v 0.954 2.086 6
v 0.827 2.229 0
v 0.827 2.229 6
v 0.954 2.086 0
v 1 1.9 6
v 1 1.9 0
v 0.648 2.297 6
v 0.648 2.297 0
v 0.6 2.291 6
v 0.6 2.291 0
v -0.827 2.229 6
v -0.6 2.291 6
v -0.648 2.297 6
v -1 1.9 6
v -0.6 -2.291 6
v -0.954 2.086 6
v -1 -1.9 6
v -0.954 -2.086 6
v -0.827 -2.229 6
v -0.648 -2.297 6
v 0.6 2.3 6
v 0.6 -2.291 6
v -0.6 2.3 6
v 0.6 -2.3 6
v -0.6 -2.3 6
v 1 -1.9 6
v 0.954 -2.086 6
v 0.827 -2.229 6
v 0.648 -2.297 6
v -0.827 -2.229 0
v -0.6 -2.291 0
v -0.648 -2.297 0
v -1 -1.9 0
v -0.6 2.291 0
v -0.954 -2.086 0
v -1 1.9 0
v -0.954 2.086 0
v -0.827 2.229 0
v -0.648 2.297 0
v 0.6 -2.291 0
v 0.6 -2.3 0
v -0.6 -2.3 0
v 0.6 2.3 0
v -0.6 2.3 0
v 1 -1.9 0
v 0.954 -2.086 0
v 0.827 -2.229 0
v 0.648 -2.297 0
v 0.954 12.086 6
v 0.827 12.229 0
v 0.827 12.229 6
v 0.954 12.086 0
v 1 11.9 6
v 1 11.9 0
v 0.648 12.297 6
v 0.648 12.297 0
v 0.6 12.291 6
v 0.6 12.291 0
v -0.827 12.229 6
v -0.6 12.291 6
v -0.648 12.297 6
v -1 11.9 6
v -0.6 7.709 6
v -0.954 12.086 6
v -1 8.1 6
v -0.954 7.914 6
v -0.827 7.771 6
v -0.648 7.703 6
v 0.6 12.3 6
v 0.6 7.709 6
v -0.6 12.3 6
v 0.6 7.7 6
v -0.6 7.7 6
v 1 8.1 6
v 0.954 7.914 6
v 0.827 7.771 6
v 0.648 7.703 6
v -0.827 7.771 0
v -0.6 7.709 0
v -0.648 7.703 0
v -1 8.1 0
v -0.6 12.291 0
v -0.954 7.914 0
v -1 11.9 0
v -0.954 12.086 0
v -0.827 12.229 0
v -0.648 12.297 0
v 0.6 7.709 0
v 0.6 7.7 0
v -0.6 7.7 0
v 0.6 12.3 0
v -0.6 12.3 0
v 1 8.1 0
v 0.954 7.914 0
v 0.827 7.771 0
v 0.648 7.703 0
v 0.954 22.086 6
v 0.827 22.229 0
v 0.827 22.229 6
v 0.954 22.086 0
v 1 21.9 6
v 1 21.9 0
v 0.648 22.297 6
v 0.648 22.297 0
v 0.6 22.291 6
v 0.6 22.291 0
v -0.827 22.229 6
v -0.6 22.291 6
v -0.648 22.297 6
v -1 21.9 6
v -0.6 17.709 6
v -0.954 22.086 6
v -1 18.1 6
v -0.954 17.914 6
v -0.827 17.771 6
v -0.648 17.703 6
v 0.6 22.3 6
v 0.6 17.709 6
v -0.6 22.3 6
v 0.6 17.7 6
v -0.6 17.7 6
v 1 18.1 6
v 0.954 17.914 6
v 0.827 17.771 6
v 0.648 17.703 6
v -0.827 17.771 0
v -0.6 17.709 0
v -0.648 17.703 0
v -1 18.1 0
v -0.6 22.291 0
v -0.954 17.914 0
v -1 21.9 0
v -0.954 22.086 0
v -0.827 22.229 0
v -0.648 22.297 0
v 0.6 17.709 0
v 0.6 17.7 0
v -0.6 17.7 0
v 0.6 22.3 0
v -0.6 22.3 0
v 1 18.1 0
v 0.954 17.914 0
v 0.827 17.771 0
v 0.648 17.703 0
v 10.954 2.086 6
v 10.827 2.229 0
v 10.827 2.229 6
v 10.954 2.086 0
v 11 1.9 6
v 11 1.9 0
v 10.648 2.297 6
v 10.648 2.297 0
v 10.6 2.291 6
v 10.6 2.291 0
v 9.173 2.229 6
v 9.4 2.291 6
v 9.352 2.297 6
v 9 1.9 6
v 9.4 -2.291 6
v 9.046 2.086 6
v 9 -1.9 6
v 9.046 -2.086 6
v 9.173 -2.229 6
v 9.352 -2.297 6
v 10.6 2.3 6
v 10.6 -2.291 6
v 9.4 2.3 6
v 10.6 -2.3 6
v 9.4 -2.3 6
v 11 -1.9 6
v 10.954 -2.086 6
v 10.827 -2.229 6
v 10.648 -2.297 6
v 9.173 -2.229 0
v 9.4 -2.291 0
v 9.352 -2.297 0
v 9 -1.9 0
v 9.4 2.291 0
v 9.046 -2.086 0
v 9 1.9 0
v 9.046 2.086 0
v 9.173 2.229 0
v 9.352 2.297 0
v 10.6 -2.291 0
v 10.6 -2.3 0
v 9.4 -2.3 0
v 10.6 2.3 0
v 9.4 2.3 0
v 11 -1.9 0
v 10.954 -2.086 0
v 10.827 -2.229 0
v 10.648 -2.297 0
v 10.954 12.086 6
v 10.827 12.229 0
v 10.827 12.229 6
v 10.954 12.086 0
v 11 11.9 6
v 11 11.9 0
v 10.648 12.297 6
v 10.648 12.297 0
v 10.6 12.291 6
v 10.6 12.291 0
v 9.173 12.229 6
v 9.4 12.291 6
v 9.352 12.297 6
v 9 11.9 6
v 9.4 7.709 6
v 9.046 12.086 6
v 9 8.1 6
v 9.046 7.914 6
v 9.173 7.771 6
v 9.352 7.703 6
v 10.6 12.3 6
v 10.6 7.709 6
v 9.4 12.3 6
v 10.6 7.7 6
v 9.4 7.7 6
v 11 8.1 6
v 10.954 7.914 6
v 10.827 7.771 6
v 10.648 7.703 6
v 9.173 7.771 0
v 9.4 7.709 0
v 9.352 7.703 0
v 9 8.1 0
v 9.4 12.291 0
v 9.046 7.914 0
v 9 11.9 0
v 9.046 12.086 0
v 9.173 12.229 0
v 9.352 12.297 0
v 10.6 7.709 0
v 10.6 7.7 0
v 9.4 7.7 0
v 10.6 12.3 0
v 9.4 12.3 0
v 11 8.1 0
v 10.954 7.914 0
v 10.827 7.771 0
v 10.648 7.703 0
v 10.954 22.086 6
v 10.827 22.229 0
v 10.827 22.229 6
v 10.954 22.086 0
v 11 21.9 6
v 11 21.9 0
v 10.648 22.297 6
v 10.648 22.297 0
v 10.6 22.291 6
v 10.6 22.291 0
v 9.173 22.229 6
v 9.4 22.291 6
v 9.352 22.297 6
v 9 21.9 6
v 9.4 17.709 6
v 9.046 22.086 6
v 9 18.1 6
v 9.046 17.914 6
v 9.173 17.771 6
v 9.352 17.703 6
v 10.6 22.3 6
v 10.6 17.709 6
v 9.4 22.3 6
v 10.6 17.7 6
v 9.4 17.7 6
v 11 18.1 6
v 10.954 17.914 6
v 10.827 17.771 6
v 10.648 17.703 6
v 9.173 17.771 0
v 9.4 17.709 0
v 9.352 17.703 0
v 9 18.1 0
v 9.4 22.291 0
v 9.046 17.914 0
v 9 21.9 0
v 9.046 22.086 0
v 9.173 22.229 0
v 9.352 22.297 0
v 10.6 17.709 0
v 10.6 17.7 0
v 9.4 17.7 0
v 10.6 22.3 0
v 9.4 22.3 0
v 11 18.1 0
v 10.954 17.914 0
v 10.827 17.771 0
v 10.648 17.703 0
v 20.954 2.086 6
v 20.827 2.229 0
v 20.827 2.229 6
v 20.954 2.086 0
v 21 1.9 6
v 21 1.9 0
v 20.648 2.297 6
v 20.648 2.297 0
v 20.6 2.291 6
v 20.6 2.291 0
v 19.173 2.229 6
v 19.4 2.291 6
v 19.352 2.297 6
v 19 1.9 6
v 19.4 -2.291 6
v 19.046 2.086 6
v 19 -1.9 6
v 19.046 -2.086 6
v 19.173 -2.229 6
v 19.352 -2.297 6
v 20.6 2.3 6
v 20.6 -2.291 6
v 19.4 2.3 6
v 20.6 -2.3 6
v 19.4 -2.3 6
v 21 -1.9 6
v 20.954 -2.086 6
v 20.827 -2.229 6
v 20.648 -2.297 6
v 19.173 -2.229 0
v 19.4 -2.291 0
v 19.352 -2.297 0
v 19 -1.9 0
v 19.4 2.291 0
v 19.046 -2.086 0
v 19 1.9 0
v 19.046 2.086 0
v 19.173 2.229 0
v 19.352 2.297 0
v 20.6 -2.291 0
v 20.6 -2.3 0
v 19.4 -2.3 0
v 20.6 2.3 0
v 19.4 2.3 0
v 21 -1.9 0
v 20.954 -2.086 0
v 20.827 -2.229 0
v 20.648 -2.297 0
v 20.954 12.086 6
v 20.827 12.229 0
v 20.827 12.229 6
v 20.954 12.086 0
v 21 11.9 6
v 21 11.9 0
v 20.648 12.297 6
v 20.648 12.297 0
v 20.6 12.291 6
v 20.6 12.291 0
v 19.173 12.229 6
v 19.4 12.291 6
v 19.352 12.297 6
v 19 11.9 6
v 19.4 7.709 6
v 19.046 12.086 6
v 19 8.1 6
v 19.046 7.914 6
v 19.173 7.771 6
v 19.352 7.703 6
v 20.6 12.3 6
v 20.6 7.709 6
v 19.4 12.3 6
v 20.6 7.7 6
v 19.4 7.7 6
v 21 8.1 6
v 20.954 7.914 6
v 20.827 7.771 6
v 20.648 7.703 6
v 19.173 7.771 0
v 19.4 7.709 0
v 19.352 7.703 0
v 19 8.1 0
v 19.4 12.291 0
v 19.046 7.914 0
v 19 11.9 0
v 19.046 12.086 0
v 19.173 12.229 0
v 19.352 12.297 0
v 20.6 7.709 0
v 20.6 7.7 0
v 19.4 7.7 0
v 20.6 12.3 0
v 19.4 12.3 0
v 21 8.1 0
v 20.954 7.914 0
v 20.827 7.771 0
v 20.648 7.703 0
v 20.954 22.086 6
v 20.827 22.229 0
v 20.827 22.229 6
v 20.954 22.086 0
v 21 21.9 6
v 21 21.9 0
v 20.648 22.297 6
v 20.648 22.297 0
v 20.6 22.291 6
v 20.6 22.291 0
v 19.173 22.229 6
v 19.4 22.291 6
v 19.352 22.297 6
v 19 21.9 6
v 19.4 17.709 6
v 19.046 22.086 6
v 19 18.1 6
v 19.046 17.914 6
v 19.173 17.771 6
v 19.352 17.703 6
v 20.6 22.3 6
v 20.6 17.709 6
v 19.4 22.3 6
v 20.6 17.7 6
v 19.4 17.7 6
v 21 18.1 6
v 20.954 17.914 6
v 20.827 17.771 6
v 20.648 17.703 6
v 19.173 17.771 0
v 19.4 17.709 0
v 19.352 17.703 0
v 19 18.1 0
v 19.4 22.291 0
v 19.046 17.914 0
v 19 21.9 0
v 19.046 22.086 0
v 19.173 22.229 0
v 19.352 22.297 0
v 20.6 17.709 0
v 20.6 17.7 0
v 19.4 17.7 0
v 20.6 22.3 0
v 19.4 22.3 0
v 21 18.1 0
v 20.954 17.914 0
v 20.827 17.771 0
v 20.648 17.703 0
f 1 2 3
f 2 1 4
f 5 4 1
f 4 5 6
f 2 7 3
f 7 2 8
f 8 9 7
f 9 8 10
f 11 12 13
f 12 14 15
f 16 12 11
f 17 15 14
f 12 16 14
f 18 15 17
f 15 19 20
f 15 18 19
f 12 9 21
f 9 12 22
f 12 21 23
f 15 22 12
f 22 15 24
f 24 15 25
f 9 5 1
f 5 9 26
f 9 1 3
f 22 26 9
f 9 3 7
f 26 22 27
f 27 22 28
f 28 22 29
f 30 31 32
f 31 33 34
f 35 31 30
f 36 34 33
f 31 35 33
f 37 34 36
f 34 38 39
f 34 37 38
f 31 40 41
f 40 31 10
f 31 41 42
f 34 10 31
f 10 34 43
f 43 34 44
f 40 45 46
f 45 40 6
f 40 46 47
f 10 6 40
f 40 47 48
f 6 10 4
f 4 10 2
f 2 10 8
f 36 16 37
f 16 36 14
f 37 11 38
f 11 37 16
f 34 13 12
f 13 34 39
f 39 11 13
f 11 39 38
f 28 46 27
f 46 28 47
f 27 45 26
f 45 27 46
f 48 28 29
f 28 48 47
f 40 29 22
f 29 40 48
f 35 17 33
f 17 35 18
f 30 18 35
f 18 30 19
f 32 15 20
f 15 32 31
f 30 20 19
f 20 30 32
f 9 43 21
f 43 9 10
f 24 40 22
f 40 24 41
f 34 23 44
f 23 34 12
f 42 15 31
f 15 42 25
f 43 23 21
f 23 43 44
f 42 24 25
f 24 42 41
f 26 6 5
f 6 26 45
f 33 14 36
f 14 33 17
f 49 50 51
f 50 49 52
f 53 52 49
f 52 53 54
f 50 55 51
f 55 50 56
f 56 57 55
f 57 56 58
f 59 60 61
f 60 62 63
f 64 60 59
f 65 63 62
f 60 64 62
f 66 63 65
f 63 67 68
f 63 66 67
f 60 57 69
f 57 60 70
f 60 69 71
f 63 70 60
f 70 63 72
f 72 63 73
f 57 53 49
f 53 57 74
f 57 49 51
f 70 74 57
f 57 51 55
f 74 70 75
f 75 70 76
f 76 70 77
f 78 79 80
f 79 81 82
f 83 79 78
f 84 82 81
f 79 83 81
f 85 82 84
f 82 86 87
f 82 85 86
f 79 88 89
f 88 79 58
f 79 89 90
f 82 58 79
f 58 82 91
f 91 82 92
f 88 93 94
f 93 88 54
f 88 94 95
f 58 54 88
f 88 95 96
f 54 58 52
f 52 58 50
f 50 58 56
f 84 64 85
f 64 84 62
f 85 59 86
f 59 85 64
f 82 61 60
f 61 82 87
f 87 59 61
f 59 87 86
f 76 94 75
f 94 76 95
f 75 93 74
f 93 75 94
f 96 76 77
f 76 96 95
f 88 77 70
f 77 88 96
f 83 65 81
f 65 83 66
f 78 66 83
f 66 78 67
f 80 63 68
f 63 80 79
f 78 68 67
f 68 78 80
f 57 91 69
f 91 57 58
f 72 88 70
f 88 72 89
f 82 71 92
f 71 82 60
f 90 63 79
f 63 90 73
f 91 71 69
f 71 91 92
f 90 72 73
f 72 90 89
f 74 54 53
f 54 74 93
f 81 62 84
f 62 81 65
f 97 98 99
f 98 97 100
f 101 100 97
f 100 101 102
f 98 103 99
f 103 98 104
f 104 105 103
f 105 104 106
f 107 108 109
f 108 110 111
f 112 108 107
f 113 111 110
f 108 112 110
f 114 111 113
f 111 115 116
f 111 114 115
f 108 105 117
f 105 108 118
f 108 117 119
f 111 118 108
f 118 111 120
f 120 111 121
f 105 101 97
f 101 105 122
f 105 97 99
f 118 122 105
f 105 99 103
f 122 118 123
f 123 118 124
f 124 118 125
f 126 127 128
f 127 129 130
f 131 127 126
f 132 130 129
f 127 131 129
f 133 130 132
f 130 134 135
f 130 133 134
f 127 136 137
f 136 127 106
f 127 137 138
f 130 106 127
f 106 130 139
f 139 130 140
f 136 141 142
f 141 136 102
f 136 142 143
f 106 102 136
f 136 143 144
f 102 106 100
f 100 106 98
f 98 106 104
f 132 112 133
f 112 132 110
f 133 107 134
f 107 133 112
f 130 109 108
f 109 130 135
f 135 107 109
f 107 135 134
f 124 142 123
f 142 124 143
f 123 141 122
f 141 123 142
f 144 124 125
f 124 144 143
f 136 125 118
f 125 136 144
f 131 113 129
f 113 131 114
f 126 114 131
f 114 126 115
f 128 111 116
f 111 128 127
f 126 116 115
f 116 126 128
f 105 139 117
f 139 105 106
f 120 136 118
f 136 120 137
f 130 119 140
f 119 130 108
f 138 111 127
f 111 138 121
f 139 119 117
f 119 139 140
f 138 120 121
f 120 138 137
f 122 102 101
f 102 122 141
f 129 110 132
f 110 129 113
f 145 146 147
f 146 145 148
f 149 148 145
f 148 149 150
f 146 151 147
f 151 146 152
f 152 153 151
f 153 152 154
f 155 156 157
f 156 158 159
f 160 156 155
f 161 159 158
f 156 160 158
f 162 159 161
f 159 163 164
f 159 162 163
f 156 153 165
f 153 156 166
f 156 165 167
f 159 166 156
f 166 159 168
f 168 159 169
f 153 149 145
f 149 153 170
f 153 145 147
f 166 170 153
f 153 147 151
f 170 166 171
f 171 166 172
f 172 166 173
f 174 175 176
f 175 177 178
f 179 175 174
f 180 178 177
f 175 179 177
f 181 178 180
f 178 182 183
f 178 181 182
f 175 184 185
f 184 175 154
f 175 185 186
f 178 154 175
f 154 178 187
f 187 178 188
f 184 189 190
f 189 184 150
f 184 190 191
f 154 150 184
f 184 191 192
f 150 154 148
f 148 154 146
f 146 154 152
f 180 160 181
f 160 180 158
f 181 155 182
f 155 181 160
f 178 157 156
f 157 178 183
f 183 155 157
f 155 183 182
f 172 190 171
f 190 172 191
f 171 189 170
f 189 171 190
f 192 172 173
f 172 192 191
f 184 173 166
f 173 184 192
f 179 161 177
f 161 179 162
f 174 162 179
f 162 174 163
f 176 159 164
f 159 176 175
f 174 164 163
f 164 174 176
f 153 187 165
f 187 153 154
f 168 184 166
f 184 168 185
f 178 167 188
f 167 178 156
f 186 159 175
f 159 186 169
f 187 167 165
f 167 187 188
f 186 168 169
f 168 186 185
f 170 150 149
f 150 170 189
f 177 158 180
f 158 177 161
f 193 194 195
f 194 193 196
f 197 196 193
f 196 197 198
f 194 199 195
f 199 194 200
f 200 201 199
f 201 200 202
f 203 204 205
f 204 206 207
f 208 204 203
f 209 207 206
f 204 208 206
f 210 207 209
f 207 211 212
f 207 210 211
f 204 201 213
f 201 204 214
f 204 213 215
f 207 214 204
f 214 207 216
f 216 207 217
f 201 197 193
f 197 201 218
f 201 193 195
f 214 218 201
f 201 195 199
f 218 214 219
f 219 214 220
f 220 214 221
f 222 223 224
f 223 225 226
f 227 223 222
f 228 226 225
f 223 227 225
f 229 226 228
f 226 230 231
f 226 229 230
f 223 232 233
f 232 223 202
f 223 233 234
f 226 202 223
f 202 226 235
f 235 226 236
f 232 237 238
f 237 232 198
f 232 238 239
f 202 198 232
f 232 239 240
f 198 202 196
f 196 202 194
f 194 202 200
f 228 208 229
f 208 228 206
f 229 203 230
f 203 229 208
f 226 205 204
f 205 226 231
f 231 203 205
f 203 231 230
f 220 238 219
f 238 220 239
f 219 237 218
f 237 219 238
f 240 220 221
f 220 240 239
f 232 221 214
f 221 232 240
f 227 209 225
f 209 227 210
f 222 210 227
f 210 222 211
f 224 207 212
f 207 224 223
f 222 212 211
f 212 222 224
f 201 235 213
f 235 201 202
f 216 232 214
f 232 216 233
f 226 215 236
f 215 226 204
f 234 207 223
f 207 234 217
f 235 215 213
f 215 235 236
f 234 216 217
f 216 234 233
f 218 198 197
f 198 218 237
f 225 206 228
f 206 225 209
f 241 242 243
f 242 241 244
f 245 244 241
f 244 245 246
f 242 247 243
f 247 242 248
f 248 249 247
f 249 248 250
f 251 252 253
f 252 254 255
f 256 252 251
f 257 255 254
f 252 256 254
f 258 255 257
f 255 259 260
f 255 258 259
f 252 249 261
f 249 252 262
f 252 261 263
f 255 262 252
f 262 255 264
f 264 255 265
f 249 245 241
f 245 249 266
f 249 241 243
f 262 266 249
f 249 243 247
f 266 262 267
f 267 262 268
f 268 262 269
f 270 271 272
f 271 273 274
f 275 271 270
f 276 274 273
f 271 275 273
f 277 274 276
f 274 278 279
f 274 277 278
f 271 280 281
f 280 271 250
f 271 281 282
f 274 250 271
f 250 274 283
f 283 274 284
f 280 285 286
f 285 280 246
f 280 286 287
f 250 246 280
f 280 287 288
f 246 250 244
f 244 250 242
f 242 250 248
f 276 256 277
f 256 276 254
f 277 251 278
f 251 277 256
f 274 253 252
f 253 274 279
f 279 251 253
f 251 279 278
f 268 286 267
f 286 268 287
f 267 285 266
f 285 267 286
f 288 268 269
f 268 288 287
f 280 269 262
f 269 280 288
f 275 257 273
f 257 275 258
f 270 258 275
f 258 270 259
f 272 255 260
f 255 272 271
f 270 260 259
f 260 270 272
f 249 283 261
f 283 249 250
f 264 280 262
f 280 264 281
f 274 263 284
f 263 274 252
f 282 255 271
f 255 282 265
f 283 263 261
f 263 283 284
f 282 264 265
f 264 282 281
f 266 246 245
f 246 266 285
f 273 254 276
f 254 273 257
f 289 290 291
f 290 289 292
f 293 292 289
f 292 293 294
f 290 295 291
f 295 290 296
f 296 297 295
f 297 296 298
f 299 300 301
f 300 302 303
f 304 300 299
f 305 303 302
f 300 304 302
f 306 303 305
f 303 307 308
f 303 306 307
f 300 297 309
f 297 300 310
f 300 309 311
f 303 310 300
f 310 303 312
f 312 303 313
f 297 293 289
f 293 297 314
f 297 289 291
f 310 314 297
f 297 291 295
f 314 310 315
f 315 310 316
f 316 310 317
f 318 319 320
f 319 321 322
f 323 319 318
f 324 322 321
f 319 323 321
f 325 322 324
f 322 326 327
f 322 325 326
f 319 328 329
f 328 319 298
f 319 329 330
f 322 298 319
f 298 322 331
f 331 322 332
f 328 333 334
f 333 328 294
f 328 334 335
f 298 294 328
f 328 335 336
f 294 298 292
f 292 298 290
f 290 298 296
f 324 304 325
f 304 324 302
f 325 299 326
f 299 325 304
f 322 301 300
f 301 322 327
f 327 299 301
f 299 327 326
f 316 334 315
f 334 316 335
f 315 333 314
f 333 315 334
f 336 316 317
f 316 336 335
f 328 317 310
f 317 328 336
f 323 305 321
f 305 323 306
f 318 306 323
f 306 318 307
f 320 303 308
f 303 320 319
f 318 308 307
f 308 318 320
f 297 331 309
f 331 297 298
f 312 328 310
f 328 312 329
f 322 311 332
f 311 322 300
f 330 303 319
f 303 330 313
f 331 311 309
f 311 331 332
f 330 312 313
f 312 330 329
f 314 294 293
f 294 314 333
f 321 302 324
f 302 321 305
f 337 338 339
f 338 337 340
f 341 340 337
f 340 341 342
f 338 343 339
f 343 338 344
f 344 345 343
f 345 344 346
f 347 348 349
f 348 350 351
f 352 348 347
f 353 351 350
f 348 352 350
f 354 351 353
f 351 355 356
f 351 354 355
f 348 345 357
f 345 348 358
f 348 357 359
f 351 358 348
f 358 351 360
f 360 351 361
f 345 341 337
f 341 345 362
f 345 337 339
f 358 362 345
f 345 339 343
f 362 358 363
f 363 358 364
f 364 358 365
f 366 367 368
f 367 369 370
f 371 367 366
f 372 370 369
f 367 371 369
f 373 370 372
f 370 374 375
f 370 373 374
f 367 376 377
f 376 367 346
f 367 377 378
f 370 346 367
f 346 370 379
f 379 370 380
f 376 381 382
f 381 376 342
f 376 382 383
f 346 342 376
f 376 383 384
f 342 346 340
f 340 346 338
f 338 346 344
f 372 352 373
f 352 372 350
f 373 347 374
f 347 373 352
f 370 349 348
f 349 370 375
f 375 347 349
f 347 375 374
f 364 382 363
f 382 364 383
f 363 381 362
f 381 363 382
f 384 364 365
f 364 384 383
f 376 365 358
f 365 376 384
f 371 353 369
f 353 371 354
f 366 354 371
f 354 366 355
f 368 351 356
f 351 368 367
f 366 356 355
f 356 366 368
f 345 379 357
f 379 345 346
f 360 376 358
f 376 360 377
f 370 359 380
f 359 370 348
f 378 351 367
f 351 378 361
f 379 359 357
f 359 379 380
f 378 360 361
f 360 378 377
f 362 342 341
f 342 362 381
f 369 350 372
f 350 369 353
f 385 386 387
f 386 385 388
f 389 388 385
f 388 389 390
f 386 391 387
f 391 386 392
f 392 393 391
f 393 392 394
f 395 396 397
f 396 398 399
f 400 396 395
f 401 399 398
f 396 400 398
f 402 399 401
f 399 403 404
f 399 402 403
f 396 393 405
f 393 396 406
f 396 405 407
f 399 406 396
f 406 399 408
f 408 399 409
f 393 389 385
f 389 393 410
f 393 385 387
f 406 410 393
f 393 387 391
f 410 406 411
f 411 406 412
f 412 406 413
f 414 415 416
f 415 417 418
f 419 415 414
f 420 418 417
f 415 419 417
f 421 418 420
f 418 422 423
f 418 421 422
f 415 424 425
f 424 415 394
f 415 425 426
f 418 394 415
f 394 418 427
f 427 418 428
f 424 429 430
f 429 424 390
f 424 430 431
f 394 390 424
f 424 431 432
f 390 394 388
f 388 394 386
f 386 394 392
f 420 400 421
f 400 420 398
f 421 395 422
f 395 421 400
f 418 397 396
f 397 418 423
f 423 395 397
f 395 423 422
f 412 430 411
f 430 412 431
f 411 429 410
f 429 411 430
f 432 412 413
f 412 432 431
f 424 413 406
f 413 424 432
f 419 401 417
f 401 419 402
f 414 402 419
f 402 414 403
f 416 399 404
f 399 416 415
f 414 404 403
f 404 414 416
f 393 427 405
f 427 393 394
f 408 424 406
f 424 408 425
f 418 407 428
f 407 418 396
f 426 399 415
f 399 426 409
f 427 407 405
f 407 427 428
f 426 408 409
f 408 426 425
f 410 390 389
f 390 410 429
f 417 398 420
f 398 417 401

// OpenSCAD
// file: irs2184-distance.scad
$fa = 1.0;
$fs = 0.2;

use <../lib/lib.scad>

module irs2184_distance()
{
	rcube
	(
		[2, 4.6, 6],
		r = 0.8,
		aX = 1,
		aY = 1
	);
}
// file: ../lib/lib.scad
function sel(v, indices) = [ for (i = indices) v[i] ];
function eps() = 0.01;

module cmirror(v = [1, 0, 0])
{
	children();
	mirror(v)
		children();
}

module rcube2d
(
	s = [10, 10, 10],
	r = 2,
	singleSided = false,
)
{
	width = s[0];
	depth = s[1];
	height = s[2];

	union()
	{
		cmirror([0, 1, 0])
		cmirror()
		translate([(width - r) / 2, (depth - r) / 2, 0])
		cylinder(h = height, d = r);
		translate([-(width - r) / 2, -depth / 2, 0])
		cube([width - r, depth, height]);
		translate([-width / 2, -(depth - r) / 2, 0])
		cube([width, depth - r, height]);
	}

	if (singleSided)
	{
		translate([-width / 2, -depth / 2, 0])
		cube([width, r, height]);
	}
}

module rcube3d
(
	s = [10, 10, 10],
	r = 2,
	singleSided = false,
)
{
	width = s[0];
	depth = s[1];
	height = s[2];

	w2 = width - r;
	d2 = depth - r;
	h2 = height - r;

	translate([0, 0, r / 2])
	rcube2d([width, depth, h2], r);

	translate([0, 0, height / 2])
	cmirror([0, 0, 1])
	cmirror([0, 1, 0])
	translate([0, d2 / 2, (height - r) / 2])
	translate([-w2 / 2, 0, 0])
	rotate([0, 90, 0])
	cylinder(h = w2, d = r);

	translate([0, 0, height / 2])
	cmirror([0, 0, 1])
	cmirror()
	translate([w2 / 2, 0, h2 / 2])
	translate([0, d2 / 2, 0])
	rotate([90, 0, 0])
	cylinder(h = d2, d = r);

	translate([-w2 / 2, -d2 / 2, 0])
	cube([w2, d2, height]);

	translate([0, 0, height / 2])
	cmirror([0, 0, 1])
	cmirror([0, 1, 0])
	cmirror()
	translate([w2 / 2, d2 / 2, h2 / 2])
	sphere(r / 2);

	if (singleSided)
	{
		translate([0, -depth / 2, height / 2])
		rotate([-90, 0, 0])
		rcube2d([width, height, r], r);
	}
}

module rcube
(
	s = [10, 10, 10],
	r = 2,
	flat = true,
	singleSided = false,
	aX = 0,
	aY = 0,
	aZ = 0,
)
{
	width = s[0];
	depth = s[1];
	height = s[2];

	rw = r > width ? width : r;

	translate
	([
		(1 - aX) * width / 2,
		(1 - aY) * depth / 2,
		-aZ * height / 2
	])
	if (flat)
		rcube2d(s, rw, singleSided);
	else
	{
		rh = rw > height ? height : rw;
		rcube3d(s, rh, singleSided);
	}
}

module chamfer
(
	s = [10, 20, 6],
	round = true,
	aX = 0,
	aY = 0,
	aZ = 0,
	rotation = 0,
)
{
	width = s[0];
	depth = s[1];
	height = s[2];

	r = width < height ? width : height;

	rotate([0, rotation * 90, 0])
	translate
	([
		-aX * r / 2,
		-aY * depth / 2,
		-aZ * r / 2
	])
	if (round)
	{
		difference()
		{
			cube(s);

			translate([r, -depth / 2, 0])
			union()
			{
				translate([0, 0, r])
				rotate([-90, 0, 0])
				cylinder(d = 2 * r, h = 2 * depth);

				translate([0, 0, -r / 2])
				cube([2 * width, 2 * depth, 2 * r]);

				translate([-1.5 * r, 0, r])
				cube([2 * r, 2 * depth, 2 * height]);
			}
		}
	}
	else
	{
		difference()
		{
			cube(s);

			translate([0, 1.5 * depth, 0])
			rotate([90, 0, 0])
			linear_extrude(2 * depth)
			polygon
			([
				[ 2 * width, -1 * height],
				[ 2 * width,  2 * height],
				[-1 * width,  2 * height],
			]);
		}
	}
}
// main file
$fa = 1.0;
$fs = 0.4;

use <../lib/lib.scad>
use <./irs2184-distance.scad>

for(u = [0 : 10 : 20])
{
	for(v = [0 : 10 : 20])
	{
		translate([u, v, 0])
			irs2184_distance();
	}
}
